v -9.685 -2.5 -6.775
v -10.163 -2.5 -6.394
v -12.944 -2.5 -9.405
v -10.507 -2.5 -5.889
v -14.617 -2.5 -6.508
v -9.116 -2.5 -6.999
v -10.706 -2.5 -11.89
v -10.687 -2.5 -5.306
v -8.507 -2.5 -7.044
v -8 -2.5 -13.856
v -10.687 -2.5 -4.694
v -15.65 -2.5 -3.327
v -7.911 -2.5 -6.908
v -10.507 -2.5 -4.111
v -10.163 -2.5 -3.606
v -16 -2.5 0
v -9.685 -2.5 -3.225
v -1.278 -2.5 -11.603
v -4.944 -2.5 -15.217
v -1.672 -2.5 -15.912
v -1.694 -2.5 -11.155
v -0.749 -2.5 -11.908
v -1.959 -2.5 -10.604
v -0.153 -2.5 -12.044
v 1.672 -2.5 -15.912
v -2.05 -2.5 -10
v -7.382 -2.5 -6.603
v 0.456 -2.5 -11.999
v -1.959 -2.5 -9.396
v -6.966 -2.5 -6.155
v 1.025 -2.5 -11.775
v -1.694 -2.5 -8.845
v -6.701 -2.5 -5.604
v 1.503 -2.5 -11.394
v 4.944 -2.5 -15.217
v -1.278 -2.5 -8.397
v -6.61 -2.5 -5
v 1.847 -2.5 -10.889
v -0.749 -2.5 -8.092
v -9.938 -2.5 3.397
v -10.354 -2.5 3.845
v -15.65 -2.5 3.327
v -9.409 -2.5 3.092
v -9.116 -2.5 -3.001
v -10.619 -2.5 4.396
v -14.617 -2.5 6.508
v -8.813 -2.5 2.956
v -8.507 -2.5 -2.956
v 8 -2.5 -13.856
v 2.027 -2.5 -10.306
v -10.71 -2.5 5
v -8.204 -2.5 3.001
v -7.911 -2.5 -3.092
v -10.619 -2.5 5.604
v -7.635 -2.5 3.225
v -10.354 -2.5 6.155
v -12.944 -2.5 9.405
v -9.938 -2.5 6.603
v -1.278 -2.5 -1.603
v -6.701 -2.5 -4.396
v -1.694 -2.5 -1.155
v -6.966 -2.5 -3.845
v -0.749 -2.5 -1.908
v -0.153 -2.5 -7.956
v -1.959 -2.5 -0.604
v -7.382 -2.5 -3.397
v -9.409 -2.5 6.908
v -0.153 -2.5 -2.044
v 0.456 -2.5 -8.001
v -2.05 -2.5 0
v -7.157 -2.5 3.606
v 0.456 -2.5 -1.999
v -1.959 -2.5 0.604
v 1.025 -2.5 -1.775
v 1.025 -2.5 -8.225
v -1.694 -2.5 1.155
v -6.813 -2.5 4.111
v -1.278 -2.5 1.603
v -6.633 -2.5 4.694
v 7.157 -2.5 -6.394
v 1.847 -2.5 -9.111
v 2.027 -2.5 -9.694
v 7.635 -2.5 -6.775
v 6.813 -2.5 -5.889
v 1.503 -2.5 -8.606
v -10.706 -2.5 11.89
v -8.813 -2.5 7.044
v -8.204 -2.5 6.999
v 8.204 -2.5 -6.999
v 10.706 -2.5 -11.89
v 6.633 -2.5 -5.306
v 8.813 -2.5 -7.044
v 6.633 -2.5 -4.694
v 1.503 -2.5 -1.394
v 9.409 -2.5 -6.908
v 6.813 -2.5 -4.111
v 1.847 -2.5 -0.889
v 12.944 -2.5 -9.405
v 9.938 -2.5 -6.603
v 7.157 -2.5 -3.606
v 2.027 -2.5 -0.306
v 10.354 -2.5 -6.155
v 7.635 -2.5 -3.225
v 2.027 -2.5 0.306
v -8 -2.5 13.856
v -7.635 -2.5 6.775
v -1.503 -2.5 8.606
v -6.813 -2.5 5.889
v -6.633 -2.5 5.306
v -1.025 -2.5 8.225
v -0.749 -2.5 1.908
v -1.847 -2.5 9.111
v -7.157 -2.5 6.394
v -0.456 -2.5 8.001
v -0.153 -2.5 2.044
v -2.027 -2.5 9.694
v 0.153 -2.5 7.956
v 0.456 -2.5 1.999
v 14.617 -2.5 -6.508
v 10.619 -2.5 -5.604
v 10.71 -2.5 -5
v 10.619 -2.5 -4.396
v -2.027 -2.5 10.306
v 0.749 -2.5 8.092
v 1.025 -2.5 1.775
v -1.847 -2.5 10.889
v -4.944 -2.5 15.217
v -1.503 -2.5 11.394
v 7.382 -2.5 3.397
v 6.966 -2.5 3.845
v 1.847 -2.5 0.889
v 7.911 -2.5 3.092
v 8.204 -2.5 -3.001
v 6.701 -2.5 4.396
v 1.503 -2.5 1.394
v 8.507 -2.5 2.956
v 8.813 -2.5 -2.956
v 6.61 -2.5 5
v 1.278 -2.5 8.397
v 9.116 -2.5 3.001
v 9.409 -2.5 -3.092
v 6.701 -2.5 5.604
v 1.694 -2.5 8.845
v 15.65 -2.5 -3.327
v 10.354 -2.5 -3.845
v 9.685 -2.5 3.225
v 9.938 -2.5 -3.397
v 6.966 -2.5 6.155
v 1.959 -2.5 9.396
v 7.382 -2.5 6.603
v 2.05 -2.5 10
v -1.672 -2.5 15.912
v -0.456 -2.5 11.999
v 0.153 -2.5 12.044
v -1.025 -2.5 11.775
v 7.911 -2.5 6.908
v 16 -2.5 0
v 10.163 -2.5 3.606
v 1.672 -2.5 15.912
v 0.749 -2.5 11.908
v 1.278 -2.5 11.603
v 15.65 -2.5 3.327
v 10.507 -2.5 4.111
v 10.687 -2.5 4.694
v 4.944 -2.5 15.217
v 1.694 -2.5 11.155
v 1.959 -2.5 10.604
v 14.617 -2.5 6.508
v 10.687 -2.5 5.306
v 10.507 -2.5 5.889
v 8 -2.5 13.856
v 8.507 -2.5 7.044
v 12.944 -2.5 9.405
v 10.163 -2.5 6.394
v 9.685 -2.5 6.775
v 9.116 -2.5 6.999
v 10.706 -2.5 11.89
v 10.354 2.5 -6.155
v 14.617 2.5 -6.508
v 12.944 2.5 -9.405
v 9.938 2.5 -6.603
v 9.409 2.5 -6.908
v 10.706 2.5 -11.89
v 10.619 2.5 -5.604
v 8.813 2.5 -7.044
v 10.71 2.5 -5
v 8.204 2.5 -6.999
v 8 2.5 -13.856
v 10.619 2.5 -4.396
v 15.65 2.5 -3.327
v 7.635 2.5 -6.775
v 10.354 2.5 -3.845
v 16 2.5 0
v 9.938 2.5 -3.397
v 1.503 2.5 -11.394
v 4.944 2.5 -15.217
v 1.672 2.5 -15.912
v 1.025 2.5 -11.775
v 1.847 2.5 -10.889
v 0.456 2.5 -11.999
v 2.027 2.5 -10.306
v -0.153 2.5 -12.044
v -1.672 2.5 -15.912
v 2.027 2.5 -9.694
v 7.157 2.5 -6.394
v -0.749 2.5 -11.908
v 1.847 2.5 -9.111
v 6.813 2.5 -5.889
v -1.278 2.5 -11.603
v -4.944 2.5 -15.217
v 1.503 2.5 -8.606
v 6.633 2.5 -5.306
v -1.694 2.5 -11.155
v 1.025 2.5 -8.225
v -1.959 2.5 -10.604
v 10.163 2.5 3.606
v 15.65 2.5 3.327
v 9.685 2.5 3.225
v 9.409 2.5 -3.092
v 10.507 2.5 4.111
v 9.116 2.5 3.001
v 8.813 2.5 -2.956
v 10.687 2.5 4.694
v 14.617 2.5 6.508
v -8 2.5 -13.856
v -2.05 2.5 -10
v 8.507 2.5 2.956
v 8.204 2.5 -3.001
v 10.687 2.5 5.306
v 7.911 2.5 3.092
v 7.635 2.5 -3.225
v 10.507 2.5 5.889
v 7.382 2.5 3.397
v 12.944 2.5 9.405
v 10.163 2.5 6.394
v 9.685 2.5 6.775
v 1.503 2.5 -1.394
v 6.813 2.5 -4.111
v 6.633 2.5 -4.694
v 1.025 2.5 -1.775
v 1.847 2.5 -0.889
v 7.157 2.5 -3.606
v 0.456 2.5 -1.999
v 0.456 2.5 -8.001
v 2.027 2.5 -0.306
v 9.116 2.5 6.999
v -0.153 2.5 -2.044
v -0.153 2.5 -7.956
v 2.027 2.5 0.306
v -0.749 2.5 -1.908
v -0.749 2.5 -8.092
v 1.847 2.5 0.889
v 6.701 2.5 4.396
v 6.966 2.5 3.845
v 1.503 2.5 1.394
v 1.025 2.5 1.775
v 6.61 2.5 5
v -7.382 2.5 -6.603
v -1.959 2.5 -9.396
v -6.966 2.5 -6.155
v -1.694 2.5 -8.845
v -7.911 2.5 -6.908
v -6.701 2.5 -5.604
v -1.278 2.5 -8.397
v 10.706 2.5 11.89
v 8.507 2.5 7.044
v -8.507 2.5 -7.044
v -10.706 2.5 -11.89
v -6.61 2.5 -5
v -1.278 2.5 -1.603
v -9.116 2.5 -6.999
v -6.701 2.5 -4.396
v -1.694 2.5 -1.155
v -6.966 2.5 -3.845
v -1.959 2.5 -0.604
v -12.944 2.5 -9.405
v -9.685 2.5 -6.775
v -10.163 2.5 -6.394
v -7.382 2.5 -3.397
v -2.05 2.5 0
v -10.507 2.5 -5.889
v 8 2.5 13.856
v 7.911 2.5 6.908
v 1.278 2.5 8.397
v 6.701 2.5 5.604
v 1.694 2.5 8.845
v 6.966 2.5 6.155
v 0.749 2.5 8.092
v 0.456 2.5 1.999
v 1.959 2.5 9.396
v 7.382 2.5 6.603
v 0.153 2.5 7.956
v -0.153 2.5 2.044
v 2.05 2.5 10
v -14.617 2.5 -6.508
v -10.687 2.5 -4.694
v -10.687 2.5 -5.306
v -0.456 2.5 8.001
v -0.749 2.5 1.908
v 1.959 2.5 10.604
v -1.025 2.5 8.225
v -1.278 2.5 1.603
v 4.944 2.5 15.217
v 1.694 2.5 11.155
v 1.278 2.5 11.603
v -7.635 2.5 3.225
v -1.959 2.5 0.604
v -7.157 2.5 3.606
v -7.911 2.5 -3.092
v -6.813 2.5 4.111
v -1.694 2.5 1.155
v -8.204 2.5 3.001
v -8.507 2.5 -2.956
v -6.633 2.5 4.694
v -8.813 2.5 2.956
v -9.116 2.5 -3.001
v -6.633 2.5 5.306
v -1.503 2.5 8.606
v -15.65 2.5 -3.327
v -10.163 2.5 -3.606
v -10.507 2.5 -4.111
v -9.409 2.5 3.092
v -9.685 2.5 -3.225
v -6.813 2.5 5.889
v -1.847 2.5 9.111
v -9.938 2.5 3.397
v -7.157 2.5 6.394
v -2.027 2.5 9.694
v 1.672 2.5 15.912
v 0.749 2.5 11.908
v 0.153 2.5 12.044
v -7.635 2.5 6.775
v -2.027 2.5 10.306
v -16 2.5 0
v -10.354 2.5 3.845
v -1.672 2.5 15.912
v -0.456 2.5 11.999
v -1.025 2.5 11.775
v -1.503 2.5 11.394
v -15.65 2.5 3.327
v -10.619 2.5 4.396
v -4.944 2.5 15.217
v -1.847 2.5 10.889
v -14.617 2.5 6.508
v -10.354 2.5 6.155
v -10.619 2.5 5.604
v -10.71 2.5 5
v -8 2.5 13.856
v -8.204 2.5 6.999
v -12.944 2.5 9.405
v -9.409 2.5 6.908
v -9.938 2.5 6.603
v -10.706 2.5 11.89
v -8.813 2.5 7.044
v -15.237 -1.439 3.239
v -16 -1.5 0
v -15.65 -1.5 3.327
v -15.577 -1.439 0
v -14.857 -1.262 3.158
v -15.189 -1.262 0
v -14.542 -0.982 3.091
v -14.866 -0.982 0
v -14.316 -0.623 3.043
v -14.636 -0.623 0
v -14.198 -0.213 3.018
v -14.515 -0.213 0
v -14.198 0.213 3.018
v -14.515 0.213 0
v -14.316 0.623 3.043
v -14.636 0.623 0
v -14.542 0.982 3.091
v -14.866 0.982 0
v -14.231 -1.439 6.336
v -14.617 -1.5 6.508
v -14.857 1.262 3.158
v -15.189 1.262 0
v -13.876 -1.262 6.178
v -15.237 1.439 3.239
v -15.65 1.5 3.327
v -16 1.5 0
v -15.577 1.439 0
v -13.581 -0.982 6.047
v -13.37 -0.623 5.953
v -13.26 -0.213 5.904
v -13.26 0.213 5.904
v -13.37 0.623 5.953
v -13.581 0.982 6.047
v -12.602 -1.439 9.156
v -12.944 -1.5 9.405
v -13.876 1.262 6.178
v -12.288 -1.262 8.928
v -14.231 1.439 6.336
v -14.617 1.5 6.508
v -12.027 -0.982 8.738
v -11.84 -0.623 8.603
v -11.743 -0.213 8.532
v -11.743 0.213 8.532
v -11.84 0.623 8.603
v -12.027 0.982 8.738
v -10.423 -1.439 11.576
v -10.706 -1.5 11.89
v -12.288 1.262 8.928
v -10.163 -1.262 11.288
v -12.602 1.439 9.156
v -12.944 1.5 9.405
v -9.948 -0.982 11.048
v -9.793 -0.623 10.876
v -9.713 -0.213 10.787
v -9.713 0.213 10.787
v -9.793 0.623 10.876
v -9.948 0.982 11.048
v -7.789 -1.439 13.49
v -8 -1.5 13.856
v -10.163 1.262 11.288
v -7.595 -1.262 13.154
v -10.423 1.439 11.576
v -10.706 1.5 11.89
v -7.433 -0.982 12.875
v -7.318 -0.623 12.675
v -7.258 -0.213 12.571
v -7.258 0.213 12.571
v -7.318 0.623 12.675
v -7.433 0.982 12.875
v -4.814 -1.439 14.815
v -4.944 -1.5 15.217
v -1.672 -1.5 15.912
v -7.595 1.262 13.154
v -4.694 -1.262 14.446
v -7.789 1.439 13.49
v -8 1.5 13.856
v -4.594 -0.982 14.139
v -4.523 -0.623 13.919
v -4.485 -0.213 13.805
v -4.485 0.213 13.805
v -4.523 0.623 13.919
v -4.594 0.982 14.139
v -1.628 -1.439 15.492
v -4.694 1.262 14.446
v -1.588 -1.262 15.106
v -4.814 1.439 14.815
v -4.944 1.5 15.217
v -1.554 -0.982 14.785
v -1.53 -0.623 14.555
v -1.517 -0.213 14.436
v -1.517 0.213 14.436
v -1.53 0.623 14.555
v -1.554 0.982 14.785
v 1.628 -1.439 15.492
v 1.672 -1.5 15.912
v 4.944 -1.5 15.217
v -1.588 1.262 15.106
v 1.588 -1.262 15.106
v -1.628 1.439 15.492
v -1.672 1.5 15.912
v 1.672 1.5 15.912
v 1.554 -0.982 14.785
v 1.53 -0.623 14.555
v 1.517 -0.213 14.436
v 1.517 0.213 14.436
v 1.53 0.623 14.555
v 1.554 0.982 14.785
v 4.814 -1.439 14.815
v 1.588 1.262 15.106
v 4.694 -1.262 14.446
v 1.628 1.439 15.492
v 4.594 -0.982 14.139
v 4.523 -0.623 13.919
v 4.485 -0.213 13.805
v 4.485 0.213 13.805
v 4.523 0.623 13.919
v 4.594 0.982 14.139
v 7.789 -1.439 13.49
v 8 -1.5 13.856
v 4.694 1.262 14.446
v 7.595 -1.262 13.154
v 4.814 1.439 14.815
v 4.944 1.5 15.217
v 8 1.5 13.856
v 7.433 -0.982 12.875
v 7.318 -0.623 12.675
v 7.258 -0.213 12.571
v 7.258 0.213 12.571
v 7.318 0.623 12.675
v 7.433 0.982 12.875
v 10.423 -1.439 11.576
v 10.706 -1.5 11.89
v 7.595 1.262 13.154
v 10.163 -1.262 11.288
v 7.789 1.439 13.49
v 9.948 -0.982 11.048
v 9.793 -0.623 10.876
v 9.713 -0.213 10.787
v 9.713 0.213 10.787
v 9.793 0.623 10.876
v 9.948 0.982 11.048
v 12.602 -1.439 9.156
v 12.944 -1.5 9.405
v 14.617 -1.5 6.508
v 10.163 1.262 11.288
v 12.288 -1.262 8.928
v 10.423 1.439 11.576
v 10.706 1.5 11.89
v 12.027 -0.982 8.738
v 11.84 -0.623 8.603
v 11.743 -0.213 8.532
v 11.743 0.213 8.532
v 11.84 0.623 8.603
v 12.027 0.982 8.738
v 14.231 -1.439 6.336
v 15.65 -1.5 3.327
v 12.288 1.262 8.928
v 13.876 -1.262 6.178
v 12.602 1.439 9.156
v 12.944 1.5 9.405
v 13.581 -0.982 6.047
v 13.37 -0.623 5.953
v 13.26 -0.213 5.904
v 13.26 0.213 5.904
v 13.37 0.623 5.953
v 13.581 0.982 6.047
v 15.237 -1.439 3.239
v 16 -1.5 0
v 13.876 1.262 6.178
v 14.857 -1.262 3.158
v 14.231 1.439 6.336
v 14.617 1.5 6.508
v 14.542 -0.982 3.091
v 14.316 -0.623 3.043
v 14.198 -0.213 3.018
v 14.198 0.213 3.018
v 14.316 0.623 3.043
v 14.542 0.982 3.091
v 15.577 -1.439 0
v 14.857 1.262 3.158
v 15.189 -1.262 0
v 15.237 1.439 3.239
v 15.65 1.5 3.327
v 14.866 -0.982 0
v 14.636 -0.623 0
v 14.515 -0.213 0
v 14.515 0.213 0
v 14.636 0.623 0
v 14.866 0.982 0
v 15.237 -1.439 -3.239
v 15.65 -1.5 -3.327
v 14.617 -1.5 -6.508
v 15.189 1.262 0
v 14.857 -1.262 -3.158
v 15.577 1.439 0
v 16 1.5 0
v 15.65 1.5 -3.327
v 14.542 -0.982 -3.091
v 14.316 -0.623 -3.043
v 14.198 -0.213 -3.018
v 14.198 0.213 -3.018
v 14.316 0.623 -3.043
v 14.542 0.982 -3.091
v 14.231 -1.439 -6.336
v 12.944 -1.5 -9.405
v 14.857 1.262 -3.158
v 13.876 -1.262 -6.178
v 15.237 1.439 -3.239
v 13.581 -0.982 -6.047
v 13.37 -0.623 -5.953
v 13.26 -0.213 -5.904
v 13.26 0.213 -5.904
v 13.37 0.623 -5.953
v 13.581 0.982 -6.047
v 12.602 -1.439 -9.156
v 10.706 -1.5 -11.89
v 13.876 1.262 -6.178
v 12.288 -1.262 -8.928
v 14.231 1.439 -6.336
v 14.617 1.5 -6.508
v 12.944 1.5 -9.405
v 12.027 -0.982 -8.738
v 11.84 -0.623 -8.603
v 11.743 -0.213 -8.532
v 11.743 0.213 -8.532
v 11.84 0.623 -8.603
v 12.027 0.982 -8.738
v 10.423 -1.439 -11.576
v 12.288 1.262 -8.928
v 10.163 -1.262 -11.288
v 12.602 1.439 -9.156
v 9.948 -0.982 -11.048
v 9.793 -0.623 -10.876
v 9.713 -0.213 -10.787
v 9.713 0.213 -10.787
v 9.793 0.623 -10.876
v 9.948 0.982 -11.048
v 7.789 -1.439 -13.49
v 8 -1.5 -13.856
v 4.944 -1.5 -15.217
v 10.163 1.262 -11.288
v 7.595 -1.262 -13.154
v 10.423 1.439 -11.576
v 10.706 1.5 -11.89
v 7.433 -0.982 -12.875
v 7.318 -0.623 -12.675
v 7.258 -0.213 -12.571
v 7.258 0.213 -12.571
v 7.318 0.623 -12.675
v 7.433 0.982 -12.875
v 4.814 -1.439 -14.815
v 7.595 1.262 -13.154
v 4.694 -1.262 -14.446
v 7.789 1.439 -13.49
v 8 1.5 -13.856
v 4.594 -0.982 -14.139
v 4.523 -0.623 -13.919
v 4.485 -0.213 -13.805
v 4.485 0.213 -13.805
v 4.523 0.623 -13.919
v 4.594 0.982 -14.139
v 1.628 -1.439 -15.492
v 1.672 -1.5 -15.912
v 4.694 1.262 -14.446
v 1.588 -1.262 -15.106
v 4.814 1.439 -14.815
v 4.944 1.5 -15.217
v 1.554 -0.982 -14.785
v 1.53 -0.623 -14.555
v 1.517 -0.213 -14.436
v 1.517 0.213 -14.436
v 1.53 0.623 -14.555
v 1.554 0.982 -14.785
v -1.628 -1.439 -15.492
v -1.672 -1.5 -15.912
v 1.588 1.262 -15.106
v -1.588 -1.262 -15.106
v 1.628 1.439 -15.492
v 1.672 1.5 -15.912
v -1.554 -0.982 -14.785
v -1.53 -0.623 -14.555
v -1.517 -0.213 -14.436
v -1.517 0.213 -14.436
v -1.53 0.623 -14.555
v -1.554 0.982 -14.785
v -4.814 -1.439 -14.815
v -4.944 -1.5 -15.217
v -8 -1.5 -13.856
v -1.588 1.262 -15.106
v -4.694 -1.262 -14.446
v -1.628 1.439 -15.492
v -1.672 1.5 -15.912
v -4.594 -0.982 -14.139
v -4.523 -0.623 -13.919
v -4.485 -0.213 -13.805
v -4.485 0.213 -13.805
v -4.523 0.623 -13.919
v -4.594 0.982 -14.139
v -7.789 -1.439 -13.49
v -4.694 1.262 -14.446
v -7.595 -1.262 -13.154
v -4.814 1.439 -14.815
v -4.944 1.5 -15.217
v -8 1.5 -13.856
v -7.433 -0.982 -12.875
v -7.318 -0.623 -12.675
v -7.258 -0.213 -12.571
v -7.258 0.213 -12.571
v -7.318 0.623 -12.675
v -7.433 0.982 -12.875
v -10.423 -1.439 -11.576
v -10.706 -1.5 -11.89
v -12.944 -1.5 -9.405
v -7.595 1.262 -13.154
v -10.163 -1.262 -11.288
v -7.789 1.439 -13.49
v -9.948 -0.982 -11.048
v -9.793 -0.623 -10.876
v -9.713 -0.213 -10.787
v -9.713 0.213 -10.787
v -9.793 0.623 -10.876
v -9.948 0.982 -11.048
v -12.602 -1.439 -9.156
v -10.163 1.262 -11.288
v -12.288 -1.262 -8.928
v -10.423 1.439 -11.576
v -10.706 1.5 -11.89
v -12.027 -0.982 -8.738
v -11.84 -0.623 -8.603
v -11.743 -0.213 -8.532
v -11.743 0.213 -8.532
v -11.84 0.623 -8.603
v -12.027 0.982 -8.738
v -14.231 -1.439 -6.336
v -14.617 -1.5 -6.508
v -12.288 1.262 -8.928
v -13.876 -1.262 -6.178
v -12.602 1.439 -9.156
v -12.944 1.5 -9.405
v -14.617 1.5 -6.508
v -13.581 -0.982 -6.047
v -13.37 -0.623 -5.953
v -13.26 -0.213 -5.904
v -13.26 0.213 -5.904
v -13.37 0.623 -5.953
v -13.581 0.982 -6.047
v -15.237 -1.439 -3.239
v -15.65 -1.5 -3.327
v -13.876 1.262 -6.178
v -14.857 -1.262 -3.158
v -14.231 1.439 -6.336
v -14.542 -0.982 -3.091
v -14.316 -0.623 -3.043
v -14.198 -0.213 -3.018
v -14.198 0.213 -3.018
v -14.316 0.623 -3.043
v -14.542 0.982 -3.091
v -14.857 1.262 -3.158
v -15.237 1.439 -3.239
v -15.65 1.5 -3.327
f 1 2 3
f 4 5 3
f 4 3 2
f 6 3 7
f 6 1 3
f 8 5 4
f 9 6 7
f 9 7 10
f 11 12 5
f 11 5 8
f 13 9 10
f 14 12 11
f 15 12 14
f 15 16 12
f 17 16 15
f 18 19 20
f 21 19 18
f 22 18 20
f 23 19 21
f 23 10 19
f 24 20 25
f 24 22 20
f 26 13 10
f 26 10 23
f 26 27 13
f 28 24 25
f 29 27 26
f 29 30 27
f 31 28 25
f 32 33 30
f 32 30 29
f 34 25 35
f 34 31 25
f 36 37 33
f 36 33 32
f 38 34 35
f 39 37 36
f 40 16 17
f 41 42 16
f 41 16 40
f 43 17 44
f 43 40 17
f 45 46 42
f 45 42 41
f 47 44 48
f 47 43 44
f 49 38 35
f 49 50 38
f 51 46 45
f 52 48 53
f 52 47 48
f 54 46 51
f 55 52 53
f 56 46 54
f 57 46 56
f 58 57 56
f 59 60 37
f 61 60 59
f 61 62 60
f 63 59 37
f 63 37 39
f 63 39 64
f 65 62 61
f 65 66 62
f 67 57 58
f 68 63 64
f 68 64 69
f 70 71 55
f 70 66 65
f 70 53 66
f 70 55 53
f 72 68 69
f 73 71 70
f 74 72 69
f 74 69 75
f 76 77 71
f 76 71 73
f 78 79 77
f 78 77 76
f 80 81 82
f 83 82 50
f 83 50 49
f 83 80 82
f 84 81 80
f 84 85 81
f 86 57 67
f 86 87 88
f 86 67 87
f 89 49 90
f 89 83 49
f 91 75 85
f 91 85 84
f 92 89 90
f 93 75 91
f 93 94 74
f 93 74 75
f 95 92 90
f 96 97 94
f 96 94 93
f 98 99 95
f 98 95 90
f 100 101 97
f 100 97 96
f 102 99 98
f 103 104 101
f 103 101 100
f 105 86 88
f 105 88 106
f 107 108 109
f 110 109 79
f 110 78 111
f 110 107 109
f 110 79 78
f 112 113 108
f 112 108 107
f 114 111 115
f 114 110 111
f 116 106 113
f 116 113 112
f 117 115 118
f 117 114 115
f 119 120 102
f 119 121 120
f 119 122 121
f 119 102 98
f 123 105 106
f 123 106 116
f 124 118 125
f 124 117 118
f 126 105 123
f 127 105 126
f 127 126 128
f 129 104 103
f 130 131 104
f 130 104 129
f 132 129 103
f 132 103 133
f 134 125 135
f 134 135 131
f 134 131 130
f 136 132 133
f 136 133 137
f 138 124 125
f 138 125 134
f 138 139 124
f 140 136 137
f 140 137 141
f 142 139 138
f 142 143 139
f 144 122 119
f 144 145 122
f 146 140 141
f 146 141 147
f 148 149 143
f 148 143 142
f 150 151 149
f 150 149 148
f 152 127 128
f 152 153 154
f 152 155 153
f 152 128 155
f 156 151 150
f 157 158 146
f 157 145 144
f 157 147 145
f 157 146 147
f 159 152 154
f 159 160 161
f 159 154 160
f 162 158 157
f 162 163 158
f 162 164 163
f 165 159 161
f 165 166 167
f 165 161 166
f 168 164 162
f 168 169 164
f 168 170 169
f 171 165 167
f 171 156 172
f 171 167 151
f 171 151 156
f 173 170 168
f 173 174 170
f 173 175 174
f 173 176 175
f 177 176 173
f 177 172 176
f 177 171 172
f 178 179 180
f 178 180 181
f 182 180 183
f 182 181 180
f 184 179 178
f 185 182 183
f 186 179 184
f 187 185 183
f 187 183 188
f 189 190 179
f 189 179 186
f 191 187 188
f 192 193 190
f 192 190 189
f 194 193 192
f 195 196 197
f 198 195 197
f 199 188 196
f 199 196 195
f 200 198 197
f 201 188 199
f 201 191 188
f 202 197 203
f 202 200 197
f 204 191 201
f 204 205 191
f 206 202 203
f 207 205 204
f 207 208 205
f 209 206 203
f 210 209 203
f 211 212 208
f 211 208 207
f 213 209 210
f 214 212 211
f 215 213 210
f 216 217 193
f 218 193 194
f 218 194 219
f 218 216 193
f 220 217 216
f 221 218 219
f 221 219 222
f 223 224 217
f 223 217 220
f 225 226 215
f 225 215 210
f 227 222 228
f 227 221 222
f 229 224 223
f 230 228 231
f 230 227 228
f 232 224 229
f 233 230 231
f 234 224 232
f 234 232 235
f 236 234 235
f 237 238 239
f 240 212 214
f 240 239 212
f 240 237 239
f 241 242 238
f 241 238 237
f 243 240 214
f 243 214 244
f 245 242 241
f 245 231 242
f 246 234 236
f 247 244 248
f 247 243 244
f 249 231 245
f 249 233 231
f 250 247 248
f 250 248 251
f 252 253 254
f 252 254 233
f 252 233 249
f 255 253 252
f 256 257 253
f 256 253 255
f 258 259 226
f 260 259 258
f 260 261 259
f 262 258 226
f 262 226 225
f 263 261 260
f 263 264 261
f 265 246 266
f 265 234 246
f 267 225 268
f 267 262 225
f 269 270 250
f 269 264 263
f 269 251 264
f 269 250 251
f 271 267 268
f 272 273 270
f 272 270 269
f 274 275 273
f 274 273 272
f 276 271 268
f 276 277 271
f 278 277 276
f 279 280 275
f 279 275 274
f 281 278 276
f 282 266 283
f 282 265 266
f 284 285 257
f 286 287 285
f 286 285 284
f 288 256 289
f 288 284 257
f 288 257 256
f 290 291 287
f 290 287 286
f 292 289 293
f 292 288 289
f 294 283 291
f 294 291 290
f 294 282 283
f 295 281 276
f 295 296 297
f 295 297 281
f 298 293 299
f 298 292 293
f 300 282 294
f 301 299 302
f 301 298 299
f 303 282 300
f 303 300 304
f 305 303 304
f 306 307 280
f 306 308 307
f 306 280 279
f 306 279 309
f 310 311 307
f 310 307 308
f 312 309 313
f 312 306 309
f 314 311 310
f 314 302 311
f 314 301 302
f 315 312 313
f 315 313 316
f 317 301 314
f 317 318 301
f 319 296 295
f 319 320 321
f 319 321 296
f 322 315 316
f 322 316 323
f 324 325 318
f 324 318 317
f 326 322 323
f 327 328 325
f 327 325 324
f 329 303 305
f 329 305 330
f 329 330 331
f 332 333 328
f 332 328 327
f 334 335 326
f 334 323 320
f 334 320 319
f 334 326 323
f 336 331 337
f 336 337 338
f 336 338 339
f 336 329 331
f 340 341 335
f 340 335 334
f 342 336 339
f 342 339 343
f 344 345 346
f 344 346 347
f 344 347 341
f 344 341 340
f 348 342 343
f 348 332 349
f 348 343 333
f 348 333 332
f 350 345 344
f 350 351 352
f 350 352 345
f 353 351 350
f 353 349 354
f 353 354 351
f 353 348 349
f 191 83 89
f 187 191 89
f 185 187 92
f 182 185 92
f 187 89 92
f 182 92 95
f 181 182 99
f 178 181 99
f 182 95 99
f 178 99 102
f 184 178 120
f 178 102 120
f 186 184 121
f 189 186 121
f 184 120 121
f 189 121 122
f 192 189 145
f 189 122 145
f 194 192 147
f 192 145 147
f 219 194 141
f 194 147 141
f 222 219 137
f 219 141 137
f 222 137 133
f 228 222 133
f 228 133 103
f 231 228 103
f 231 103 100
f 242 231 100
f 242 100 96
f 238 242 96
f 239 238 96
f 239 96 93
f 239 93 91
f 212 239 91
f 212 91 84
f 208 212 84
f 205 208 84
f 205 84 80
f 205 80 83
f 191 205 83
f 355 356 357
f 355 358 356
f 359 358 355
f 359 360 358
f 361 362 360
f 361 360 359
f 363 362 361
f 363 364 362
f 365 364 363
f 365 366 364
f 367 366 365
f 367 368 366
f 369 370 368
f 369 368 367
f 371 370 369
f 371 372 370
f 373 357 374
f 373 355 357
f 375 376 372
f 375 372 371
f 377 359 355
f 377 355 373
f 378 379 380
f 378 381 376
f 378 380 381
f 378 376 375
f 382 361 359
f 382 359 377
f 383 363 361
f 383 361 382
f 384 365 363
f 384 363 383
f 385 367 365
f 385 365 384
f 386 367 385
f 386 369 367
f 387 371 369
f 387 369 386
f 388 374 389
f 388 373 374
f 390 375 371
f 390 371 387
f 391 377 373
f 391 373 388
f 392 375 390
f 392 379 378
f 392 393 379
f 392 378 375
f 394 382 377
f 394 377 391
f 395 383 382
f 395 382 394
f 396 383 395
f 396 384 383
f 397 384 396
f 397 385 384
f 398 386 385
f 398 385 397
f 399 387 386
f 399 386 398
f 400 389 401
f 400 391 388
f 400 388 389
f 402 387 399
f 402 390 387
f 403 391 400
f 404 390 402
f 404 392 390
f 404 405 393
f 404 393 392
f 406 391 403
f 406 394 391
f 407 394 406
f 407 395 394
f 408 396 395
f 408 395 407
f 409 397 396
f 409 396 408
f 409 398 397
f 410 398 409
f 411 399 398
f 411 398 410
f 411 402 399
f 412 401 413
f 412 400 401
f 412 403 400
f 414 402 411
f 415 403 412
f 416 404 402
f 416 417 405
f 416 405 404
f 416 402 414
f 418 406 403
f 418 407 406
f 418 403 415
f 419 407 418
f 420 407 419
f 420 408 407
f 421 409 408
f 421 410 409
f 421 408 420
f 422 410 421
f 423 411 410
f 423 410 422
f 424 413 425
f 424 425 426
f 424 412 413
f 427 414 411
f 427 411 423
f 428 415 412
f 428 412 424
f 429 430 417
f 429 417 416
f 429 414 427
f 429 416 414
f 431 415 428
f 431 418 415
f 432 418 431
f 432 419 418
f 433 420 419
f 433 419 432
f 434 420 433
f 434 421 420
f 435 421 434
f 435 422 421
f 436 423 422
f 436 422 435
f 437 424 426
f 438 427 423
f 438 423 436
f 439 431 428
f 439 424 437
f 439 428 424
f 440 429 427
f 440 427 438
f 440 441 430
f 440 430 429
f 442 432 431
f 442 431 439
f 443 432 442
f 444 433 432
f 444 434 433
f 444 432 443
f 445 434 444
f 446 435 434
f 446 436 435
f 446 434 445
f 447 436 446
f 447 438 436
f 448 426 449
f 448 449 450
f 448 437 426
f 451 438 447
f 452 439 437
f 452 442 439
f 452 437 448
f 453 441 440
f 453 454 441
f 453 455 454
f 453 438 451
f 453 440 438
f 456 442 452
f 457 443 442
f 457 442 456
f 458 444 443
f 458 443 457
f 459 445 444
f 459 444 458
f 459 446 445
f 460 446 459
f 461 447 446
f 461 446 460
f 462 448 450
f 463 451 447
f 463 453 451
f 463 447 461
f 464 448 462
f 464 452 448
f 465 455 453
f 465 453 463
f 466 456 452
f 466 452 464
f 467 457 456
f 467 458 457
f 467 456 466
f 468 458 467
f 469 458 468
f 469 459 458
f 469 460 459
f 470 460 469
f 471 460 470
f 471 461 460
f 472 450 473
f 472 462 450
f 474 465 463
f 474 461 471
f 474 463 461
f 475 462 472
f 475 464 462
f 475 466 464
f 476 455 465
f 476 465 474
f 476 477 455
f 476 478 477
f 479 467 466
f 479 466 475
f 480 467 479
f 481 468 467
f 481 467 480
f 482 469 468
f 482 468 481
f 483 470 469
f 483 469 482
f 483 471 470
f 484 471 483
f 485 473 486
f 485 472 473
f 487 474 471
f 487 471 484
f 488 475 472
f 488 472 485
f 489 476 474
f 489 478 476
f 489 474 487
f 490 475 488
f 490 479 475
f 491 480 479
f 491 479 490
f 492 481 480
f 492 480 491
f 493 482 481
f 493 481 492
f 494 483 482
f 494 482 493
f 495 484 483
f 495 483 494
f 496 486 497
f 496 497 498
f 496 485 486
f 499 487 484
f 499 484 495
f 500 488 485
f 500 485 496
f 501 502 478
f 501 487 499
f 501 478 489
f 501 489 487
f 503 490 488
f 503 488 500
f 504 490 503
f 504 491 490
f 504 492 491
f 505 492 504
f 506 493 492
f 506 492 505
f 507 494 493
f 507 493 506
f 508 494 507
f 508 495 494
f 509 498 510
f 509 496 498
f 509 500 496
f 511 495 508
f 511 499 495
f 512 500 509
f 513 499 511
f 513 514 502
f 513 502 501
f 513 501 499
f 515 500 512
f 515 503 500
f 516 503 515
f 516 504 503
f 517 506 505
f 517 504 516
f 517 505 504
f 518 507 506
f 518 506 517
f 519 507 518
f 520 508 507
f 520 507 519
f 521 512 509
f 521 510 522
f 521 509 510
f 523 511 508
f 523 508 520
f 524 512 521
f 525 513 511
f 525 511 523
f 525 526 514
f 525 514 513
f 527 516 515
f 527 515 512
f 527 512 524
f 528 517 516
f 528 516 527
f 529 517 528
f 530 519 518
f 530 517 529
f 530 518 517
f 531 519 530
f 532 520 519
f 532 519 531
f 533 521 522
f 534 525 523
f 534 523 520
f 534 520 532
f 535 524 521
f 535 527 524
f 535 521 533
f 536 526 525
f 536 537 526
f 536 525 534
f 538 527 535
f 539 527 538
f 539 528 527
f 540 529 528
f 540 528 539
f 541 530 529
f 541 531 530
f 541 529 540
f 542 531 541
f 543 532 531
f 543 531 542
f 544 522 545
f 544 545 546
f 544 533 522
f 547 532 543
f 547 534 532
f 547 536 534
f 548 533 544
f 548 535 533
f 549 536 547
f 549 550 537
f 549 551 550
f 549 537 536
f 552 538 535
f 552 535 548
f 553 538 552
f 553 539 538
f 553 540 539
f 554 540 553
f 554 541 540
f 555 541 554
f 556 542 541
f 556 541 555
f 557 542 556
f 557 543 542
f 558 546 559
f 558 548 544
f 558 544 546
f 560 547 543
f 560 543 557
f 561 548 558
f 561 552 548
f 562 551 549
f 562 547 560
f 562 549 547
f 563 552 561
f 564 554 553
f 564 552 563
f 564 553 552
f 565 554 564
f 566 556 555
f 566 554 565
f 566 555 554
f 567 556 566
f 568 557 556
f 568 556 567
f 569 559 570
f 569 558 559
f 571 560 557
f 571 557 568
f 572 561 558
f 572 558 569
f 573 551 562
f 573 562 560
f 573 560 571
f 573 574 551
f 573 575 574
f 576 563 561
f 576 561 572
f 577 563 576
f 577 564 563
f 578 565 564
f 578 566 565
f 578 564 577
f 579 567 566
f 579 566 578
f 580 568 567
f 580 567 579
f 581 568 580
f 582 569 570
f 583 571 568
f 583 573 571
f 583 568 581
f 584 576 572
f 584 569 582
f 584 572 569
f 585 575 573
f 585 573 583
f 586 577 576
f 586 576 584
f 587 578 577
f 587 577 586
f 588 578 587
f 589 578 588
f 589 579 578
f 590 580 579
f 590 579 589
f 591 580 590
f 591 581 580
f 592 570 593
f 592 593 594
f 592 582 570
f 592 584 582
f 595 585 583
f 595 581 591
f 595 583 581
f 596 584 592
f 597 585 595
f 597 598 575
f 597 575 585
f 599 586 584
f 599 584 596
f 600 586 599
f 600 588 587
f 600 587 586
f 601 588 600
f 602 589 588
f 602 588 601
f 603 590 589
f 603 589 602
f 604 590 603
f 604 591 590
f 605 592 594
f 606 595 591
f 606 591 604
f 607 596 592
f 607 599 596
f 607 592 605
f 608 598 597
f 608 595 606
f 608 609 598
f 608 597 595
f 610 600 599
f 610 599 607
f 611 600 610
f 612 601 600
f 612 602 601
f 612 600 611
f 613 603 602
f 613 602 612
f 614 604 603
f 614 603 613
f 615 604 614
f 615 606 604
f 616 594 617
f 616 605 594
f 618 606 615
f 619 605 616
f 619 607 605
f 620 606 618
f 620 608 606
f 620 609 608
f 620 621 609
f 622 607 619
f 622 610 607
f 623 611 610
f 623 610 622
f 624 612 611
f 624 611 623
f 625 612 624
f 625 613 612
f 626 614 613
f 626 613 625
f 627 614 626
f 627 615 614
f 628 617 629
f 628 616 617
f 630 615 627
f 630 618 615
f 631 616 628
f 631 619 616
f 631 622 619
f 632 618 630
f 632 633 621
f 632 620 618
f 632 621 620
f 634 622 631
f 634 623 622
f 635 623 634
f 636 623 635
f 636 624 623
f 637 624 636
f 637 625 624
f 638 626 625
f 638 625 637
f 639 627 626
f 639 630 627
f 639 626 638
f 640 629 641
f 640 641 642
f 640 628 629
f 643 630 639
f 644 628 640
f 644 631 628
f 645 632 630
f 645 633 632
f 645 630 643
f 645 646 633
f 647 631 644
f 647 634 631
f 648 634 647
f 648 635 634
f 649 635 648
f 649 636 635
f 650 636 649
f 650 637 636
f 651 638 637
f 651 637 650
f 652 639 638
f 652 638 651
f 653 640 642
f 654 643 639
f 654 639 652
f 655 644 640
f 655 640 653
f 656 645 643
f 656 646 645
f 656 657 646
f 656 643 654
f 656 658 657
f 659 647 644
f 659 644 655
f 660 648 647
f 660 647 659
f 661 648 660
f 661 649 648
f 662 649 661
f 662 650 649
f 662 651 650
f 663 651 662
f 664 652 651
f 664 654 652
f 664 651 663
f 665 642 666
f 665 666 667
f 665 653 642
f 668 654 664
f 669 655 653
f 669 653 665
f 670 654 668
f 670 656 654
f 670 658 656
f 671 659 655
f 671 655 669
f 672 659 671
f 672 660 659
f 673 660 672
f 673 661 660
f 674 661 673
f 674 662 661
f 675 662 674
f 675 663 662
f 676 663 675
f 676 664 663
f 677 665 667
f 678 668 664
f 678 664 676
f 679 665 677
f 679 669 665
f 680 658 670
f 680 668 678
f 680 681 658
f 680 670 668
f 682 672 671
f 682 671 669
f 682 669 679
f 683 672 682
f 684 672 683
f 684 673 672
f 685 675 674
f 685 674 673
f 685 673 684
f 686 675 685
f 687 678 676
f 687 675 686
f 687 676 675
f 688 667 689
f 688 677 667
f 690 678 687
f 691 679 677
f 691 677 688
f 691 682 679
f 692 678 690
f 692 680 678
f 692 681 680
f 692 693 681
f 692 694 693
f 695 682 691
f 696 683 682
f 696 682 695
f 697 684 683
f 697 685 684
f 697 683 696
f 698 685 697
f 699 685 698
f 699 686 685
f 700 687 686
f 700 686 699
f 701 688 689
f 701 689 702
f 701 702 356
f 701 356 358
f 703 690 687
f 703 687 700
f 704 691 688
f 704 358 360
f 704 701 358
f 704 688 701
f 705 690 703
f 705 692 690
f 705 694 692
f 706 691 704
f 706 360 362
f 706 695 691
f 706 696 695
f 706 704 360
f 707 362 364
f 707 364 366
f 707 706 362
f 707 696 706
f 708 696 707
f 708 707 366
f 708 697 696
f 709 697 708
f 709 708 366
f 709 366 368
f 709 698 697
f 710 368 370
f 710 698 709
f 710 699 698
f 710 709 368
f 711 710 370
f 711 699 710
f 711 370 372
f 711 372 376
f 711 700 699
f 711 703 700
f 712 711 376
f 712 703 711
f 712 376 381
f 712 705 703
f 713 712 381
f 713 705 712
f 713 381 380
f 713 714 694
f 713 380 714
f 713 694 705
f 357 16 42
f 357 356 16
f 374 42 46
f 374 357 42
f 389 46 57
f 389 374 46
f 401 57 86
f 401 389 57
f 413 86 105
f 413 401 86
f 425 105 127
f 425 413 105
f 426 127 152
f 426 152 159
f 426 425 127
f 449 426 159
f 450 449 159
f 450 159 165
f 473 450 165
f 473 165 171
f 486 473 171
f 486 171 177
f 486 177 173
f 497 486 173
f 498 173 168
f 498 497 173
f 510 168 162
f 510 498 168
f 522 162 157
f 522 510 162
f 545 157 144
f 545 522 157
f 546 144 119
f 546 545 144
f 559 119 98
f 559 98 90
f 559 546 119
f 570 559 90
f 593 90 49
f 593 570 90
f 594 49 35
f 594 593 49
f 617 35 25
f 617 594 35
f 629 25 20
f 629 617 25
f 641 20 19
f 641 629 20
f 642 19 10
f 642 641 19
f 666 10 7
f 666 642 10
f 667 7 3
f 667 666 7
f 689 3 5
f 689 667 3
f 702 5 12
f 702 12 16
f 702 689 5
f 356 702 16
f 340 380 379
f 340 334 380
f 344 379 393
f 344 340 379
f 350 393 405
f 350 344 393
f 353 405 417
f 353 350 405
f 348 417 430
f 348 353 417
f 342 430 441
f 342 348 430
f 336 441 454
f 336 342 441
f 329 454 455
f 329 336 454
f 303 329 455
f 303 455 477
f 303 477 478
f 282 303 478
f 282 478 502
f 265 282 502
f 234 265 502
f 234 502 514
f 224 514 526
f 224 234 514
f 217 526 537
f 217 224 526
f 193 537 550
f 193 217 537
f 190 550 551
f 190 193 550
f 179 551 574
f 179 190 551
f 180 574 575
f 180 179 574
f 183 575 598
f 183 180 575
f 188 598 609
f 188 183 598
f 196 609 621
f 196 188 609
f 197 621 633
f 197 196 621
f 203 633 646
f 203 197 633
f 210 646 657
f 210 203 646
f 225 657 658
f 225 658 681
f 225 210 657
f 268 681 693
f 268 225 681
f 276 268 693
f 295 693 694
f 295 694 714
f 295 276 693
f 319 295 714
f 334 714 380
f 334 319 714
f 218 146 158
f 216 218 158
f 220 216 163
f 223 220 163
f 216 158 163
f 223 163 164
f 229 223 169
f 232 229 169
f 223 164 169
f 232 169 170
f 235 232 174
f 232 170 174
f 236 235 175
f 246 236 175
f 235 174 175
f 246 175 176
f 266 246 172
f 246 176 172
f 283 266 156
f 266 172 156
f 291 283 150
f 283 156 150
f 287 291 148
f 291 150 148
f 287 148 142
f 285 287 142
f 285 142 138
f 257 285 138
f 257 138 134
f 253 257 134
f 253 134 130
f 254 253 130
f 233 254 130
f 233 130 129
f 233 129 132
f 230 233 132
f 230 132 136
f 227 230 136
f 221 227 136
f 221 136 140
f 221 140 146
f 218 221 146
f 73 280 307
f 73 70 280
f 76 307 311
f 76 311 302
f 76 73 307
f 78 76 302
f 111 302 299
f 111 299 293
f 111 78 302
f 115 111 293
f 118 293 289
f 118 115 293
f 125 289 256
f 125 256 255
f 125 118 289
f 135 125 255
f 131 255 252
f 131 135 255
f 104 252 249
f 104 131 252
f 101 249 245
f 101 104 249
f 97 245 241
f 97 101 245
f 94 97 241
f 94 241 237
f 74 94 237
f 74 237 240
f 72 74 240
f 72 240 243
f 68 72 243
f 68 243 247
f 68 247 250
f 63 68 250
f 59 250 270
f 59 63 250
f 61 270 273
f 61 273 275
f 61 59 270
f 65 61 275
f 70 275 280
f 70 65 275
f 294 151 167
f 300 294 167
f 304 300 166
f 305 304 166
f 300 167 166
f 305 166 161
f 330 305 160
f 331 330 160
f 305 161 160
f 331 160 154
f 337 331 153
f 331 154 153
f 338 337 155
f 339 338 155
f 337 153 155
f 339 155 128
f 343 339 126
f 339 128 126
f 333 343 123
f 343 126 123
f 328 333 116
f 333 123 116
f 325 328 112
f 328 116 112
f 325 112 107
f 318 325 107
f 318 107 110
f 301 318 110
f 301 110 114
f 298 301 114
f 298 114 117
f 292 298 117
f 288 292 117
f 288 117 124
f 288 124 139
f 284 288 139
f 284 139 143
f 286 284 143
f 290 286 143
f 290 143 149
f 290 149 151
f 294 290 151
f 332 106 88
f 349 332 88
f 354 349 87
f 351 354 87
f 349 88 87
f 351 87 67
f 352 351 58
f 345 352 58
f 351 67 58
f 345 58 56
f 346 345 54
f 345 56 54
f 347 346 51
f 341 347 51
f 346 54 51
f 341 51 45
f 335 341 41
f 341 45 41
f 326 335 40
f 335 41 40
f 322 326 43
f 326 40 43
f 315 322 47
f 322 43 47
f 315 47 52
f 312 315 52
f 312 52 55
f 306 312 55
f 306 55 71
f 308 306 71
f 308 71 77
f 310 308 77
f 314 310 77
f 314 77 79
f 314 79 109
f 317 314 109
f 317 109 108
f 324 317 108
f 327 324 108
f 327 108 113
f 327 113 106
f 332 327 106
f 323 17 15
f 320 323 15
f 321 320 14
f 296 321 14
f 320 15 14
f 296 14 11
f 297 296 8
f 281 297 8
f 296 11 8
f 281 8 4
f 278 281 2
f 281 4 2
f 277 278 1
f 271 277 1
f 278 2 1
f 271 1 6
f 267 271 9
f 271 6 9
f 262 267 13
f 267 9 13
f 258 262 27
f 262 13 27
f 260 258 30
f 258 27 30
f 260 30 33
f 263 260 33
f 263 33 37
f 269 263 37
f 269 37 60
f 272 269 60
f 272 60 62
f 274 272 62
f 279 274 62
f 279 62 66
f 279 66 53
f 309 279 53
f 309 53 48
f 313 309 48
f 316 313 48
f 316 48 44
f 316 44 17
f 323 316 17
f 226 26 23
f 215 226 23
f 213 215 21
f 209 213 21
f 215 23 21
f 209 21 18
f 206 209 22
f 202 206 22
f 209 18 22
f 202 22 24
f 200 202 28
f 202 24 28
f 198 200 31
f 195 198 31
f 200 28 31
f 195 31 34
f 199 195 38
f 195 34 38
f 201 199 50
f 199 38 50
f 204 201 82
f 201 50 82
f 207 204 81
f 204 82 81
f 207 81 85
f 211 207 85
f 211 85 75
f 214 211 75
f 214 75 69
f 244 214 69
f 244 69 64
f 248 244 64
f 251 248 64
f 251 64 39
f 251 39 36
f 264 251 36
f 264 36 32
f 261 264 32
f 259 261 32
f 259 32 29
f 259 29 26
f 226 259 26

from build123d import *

# Parameters (mm, degrees)
SKETCH001_R        = 2.05
POCKET_DEPTH       = 96.06142
POLARPATTERN_COUNT = 6


with BuildPart() as part:
    # Sketch → Revolution (revolve)
    with BuildSketch(Plane.XY):
        with BuildLine():
            Line((-2.05, 2.5), (-2.05, -2.5))
            Line((-2.05, -2.5), (-16, -2.5))
            Line((-16, -2.5), (-16, -1.5))
            ThreePointArc((-16, -1.5), (-14.5, 0), (-16, 1.5))
            Line((-16, 1.5), (-16, 2.5))
            Line((-16, 2.5), (-2.05, 2.5))
        make_face()
    revolve(axis=Axis((0, 0, 0), (0, 1, 0)))

    # Sketch001 → Pocket (cut, through all)
    with BuildSketch(Plane.XZ.offset(2.5)):
        with Locations((0, 10)):
            Circle(SKETCH001_R)
    pocket = extrude(amount=-POCKET_DEPTH, mode=Mode.SUBTRACT)

    # PolarPattern: Pocket ×6 about axis
    polarpattern_axis = Axis((0, -2.5, 0), (0, -1, 0))
    for i in range(1, POLARPATTERN_COUNT):
        add(pocket.rotate(polarpattern_axis, i * 360 / POLARPATTERN_COUNT), mode=Mode.SUBTRACT)


solid = part.part
